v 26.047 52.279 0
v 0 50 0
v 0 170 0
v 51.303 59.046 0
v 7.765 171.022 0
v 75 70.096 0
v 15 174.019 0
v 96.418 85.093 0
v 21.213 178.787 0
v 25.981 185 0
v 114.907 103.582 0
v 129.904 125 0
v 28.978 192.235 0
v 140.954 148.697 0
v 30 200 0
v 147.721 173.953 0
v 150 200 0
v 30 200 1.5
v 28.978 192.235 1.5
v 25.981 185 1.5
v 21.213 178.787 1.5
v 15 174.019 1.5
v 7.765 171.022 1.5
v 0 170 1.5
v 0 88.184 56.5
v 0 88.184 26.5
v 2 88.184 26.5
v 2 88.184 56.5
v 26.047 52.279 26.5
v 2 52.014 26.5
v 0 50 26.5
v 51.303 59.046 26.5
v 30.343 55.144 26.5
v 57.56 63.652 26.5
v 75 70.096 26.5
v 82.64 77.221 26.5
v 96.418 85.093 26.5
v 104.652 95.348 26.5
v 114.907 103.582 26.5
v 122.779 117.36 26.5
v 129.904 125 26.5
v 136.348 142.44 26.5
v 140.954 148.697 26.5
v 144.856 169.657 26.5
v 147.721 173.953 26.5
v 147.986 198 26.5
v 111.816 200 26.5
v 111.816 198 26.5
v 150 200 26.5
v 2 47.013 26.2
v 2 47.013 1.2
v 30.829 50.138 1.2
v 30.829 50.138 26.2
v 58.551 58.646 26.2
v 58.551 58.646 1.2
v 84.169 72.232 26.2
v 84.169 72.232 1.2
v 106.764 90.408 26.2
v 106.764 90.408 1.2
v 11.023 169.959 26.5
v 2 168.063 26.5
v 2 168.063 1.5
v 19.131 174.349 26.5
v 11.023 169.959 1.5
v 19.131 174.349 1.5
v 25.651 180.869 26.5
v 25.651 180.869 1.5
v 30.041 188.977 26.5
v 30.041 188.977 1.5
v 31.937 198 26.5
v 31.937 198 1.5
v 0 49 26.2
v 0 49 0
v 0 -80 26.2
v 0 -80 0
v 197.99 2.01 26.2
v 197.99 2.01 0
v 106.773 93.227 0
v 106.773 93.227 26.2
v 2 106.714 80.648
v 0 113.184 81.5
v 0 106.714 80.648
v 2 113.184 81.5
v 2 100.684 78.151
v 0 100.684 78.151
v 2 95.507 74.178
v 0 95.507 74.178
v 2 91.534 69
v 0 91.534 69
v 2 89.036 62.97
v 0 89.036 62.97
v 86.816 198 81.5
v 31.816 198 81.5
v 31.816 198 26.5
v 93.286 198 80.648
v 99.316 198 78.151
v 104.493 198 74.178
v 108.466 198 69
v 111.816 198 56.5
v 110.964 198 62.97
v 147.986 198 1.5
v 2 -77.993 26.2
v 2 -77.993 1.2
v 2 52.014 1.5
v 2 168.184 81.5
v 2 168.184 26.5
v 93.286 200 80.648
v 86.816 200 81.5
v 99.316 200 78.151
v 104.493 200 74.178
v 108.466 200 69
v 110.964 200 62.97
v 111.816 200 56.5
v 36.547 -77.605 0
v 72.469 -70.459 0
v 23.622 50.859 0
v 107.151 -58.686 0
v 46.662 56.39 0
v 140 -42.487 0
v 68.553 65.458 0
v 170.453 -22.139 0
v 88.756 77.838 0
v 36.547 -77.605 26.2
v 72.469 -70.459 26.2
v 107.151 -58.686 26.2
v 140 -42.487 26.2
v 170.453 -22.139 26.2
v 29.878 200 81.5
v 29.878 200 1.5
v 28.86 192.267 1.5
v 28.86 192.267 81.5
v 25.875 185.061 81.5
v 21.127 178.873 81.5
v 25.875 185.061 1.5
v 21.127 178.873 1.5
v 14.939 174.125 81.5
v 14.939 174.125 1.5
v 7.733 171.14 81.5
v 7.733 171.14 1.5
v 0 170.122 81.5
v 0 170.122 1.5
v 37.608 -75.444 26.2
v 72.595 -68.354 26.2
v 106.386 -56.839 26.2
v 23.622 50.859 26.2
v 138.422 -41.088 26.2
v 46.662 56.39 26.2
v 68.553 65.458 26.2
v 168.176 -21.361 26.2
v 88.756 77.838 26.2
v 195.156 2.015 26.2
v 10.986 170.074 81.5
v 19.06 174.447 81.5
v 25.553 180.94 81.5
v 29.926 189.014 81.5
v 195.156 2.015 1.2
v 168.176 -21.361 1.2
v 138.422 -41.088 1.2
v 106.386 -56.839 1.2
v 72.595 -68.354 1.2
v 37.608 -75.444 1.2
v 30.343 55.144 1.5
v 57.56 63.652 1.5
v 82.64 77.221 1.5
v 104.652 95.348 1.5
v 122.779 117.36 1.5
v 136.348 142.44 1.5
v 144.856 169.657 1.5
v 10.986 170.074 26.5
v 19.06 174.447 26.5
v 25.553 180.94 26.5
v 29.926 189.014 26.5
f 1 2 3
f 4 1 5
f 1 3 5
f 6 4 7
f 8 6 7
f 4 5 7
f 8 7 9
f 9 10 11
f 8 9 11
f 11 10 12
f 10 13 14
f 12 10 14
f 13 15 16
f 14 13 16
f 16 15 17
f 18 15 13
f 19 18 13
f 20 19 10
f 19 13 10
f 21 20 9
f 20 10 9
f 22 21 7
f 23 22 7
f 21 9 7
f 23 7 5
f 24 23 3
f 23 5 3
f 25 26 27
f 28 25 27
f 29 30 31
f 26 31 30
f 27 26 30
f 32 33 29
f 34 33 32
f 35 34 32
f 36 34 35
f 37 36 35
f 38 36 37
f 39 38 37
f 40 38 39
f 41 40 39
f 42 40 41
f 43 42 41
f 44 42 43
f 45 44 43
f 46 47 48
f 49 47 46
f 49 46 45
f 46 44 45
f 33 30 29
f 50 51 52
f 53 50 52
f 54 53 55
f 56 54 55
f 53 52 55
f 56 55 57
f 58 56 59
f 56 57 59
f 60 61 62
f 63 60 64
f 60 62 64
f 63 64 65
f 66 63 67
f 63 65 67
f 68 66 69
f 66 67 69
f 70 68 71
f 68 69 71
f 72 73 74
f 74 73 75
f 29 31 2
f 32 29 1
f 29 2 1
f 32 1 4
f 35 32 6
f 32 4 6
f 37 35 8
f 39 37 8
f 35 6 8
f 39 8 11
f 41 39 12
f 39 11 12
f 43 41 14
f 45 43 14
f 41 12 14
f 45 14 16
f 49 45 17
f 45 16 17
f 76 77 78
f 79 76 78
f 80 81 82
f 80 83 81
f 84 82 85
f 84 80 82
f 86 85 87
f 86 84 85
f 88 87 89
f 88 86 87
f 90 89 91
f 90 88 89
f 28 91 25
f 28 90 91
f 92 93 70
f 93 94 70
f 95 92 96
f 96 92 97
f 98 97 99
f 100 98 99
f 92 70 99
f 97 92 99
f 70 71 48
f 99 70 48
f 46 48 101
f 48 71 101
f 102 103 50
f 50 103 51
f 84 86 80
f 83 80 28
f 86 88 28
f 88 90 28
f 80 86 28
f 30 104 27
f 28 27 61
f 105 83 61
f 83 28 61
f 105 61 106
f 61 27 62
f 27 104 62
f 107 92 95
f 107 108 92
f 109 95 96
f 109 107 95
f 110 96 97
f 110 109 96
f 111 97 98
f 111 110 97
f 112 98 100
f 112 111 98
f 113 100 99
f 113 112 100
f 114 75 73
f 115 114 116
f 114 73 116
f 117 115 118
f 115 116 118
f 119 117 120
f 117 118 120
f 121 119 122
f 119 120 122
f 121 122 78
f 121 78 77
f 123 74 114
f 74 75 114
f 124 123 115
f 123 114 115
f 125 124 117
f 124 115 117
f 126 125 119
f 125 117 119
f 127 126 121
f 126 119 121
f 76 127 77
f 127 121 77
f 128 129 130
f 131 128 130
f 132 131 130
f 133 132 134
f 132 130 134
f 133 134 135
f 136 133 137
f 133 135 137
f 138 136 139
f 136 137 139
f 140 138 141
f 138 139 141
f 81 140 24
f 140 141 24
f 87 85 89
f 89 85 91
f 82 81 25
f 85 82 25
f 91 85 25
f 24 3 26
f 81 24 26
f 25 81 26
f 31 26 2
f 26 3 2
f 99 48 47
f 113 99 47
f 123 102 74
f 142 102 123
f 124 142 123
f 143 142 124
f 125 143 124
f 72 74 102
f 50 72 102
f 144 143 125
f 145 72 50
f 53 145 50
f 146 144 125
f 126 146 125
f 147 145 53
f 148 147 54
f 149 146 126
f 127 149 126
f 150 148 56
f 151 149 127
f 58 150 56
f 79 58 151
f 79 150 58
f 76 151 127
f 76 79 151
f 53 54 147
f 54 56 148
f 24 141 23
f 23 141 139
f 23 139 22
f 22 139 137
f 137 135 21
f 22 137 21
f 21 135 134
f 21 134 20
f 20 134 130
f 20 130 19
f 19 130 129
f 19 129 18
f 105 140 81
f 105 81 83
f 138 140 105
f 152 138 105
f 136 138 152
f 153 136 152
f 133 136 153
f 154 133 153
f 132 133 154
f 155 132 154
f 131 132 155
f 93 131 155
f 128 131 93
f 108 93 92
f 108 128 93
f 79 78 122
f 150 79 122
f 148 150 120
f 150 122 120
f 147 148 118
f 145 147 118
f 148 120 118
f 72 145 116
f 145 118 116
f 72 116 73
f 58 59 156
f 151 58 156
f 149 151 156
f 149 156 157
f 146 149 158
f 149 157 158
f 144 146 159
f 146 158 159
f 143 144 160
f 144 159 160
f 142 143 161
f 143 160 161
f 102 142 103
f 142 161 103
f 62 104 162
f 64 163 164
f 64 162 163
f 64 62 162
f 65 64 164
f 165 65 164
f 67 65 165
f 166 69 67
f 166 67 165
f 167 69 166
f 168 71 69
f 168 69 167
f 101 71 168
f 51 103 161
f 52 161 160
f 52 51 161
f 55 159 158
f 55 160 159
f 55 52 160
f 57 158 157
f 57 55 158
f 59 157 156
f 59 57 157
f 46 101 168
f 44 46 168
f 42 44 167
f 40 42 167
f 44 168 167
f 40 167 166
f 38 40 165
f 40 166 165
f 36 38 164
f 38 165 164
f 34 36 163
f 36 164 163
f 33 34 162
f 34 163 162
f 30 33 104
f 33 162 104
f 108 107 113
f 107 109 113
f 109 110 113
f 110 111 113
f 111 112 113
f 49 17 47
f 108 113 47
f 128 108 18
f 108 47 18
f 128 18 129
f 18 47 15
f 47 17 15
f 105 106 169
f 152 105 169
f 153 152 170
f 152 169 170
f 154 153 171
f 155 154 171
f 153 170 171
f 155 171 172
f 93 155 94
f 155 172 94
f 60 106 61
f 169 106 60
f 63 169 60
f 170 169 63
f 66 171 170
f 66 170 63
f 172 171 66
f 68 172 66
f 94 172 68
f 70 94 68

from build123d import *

# Parameters (mm, degrees)
F1_DEPTH = 1.5
F3_DEPTH = 25
F5_DEPTH = 1.2
F7_DEPTH = 25
F9_DEPTH = 80
F10_R    = 25


with BuildPart() as f1:
    # F0 (on Top) → F1 (new body)
    with BuildSketch(Plane.XY):
        with BuildLine():
            ThreePointArc((30, 200), (21.213203, 178.786797), (0, 170))
            Line((0, 170), (0, 50))
            ThreePointArc((0, 50), (106.066017, 93.933983), (150, 200))
            Line((150, 200), (30, 200))
        make_face()
    extrude(amount=F1_DEPTH)

    # F2 (on face) → F3 (join)
    with BuildSketch(Plane.XY.offset(1.5)):
        with BuildLine():
            ThreePointArc((30, 200), (21.213203, 178.786797), (0, 170))
            Line((0, 170), (0, 168))
            ThreePointArc((0, 168), (1.000489, 168.015644), (2, 168.062561))
            ThreePointArc((2, 168.062561), (22.627417, 177.372583), (31.937439, 198))
            ThreePointArc((31.937439, 198), (31.984356, 198.999511), (32, 200))
            Line((32, 200), (30, 200))
        make_face()
        with BuildLine():
            ThreePointArc((2, 168.062561), (1.000489, 168.015644), (0, 168))
            Line((0, 168), (0, 52))
            ThreePointArc((0, 52), (1.000023, 52.003379), (2, 52.013514))
            Line((2, 52.013514), (2, 168.062561))
        make_face()
        with BuildLine():
            Line((148, 200), (32, 200))
            ThreePointArc((32, 200), (31.984356, 198.999511), (31.937439, 198))
            Line((31.937439, 198), (147.986486, 198))
            ThreePointArc((147.986486, 198), (147.996621, 198.999977), (148, 200))
        make_face()
        with BuildLine():
            ThreePointArc((2, 52.013514), (1.000023, 52.003379), (0, 52))
            Line((0, 52), (0, 50))
            ThreePointArc((0, 50), (106.066017, 93.933983), (150, 200))
            Line((150, 200), (148, 200))
            ThreePointArc((148, 200), (147.996621, 198.999977), (147.986486, 198))
            ThreePointArc((147.986486, 198), (104.651804, 95.348196), (2, 52.013514))
        make_face()
    extrude(amount=F3_DEPTH)

    # F8 (on face) → F9 (join)
    with BuildSketch(Plane.XY.offset(1.5)):
        with BuildLine():
            ThreePointArc((29.878434, 200), (21.127243, 178.872757), (0, 170.121566))
            Line((0, 170.121566), (0, 168.121566))
            ThreePointArc((0, 168.121566), (1.000493, 168.13727), (2, 168.184366))
            ThreePointArc((2, 168.184366), (22.541457, 177.458543), (31.815634, 198))
            ThreePointArc((31.815634, 198), (31.86273, 198.999507), (31.878434, 200))
            Line((31.878434, 200), (29.878434, 200))
        make_face()
        with BuildLine():
            ThreePointArc((2, 168.184366), (1.000493, 168.13727), (0, 168.121566))
            Line((0, 168.121566), (0, 88.184366))
            Line((0, 88.184366), (2, 88.184366))
            Line((2, 88.184366), (2, 168.184366))
        make_face()
        with BuildLine():
            Line((111.815634, 200), (31.878434, 200))
            ThreePointArc((31.878434, 200), (31.86273, 198.999507), (31.815634, 198))
            Line((31.815634, 198), (111.815634, 198))
            Line((111.815634, 198), (111.815634, 200))
        make_face()
    extrude(amount=F9_DEPTH)

    # F10
    f10_edges = [f1.edges().sort_by_distance(p)[0] for p in [
        (111.815634, 199, 81.5),
        (1, 88.184366, 81.5),
    ]]
    fillet(f10_edges, radius=F10_R)


with BuildPart() as f5:
    # F4 (on Top) → F5 (new body)
    with BuildSketch(Plane.XY):
        with BuildLine():
            ThreePointArc((106.773124, 93.226876), (57.785198, 60.494191), (0, 49))
            Line((0, 49), (0, -80))
            ThreePointArc((0, -80), (107.151361, -58.686269), (197.989899, 2.010101))
            Line((197.989899, 2.010101), (106.773124, 93.226876))
        make_face()
    extrude(amount=F5_DEPTH)

    # F6 (on face) → F7 (join)
    with BuildSketch(Plane.XY.offset(1.2)):
        with BuildLine():
            ThreePointArc((106.773124, 93.226876), (57.785198, 60.494191), (0, 49))
            Line((0, 49), (0, 47))
            ThreePointArc((0, 47), (1.000021, 47.003268), (2, 47.013072))
            ThreePointArc((2, 47.013072), (58.550565, 58.646432), (106.76388, 90.407693))
            ThreePointArc((106.76388, 90.407693), (107.477905, 91.107852), (108.187338, 91.812662))
            Line((108.187338, 91.812662), (106.773124, 93.226876))
        make_face()
        with BuildLine():
            ThreePointArc((2, 47.013072), (1.000021, 47.003268), (0, 47))
            Line((0, 47), (0, -78))
            ThreePointArc((0, -78), (1.000006, -77.998201), (2, -77.992806))
            Line((2, -77.992806), (2, 47.013072))
        make_face()
        with BuildLine():
            Line((196.575685, 3.424315), (108.187338, 91.812662))
            ThreePointArc((108.187338, 91.812662), (107.477905, 91.107852), (106.76388, 90.407693))
            Line((106.76388, 90.407693), (195.156384, 2.015188))
            ThreePointArc((195.156384, 2.015188), (195.867302, 2.718475), (196.575685, 3.424315))
        make_face()
        with BuildLine():
            ThreePointArc((2, -77.992806), (1.000006, -77.998201), (0, -78))
            Line((0, -78), (0, -80))
            ThreePointArc((0, -80), (107.151361, -58.686269), (197.989899, 2.010101))
            Line((197.989899, 2.010101), (196.575685, 3.424315))
            ThreePointArc((196.575685, 3.424315), (195.867302, 2.718475), (195.156384, 2.015188))
            ThreePointArc((195.156384, 2.015188), (106.385994, -56.83851), (2, -77.992806))
        make_face()
    extrude(amount=F7_DEPTH)


solid = Compound([f1.part, f5.part])
